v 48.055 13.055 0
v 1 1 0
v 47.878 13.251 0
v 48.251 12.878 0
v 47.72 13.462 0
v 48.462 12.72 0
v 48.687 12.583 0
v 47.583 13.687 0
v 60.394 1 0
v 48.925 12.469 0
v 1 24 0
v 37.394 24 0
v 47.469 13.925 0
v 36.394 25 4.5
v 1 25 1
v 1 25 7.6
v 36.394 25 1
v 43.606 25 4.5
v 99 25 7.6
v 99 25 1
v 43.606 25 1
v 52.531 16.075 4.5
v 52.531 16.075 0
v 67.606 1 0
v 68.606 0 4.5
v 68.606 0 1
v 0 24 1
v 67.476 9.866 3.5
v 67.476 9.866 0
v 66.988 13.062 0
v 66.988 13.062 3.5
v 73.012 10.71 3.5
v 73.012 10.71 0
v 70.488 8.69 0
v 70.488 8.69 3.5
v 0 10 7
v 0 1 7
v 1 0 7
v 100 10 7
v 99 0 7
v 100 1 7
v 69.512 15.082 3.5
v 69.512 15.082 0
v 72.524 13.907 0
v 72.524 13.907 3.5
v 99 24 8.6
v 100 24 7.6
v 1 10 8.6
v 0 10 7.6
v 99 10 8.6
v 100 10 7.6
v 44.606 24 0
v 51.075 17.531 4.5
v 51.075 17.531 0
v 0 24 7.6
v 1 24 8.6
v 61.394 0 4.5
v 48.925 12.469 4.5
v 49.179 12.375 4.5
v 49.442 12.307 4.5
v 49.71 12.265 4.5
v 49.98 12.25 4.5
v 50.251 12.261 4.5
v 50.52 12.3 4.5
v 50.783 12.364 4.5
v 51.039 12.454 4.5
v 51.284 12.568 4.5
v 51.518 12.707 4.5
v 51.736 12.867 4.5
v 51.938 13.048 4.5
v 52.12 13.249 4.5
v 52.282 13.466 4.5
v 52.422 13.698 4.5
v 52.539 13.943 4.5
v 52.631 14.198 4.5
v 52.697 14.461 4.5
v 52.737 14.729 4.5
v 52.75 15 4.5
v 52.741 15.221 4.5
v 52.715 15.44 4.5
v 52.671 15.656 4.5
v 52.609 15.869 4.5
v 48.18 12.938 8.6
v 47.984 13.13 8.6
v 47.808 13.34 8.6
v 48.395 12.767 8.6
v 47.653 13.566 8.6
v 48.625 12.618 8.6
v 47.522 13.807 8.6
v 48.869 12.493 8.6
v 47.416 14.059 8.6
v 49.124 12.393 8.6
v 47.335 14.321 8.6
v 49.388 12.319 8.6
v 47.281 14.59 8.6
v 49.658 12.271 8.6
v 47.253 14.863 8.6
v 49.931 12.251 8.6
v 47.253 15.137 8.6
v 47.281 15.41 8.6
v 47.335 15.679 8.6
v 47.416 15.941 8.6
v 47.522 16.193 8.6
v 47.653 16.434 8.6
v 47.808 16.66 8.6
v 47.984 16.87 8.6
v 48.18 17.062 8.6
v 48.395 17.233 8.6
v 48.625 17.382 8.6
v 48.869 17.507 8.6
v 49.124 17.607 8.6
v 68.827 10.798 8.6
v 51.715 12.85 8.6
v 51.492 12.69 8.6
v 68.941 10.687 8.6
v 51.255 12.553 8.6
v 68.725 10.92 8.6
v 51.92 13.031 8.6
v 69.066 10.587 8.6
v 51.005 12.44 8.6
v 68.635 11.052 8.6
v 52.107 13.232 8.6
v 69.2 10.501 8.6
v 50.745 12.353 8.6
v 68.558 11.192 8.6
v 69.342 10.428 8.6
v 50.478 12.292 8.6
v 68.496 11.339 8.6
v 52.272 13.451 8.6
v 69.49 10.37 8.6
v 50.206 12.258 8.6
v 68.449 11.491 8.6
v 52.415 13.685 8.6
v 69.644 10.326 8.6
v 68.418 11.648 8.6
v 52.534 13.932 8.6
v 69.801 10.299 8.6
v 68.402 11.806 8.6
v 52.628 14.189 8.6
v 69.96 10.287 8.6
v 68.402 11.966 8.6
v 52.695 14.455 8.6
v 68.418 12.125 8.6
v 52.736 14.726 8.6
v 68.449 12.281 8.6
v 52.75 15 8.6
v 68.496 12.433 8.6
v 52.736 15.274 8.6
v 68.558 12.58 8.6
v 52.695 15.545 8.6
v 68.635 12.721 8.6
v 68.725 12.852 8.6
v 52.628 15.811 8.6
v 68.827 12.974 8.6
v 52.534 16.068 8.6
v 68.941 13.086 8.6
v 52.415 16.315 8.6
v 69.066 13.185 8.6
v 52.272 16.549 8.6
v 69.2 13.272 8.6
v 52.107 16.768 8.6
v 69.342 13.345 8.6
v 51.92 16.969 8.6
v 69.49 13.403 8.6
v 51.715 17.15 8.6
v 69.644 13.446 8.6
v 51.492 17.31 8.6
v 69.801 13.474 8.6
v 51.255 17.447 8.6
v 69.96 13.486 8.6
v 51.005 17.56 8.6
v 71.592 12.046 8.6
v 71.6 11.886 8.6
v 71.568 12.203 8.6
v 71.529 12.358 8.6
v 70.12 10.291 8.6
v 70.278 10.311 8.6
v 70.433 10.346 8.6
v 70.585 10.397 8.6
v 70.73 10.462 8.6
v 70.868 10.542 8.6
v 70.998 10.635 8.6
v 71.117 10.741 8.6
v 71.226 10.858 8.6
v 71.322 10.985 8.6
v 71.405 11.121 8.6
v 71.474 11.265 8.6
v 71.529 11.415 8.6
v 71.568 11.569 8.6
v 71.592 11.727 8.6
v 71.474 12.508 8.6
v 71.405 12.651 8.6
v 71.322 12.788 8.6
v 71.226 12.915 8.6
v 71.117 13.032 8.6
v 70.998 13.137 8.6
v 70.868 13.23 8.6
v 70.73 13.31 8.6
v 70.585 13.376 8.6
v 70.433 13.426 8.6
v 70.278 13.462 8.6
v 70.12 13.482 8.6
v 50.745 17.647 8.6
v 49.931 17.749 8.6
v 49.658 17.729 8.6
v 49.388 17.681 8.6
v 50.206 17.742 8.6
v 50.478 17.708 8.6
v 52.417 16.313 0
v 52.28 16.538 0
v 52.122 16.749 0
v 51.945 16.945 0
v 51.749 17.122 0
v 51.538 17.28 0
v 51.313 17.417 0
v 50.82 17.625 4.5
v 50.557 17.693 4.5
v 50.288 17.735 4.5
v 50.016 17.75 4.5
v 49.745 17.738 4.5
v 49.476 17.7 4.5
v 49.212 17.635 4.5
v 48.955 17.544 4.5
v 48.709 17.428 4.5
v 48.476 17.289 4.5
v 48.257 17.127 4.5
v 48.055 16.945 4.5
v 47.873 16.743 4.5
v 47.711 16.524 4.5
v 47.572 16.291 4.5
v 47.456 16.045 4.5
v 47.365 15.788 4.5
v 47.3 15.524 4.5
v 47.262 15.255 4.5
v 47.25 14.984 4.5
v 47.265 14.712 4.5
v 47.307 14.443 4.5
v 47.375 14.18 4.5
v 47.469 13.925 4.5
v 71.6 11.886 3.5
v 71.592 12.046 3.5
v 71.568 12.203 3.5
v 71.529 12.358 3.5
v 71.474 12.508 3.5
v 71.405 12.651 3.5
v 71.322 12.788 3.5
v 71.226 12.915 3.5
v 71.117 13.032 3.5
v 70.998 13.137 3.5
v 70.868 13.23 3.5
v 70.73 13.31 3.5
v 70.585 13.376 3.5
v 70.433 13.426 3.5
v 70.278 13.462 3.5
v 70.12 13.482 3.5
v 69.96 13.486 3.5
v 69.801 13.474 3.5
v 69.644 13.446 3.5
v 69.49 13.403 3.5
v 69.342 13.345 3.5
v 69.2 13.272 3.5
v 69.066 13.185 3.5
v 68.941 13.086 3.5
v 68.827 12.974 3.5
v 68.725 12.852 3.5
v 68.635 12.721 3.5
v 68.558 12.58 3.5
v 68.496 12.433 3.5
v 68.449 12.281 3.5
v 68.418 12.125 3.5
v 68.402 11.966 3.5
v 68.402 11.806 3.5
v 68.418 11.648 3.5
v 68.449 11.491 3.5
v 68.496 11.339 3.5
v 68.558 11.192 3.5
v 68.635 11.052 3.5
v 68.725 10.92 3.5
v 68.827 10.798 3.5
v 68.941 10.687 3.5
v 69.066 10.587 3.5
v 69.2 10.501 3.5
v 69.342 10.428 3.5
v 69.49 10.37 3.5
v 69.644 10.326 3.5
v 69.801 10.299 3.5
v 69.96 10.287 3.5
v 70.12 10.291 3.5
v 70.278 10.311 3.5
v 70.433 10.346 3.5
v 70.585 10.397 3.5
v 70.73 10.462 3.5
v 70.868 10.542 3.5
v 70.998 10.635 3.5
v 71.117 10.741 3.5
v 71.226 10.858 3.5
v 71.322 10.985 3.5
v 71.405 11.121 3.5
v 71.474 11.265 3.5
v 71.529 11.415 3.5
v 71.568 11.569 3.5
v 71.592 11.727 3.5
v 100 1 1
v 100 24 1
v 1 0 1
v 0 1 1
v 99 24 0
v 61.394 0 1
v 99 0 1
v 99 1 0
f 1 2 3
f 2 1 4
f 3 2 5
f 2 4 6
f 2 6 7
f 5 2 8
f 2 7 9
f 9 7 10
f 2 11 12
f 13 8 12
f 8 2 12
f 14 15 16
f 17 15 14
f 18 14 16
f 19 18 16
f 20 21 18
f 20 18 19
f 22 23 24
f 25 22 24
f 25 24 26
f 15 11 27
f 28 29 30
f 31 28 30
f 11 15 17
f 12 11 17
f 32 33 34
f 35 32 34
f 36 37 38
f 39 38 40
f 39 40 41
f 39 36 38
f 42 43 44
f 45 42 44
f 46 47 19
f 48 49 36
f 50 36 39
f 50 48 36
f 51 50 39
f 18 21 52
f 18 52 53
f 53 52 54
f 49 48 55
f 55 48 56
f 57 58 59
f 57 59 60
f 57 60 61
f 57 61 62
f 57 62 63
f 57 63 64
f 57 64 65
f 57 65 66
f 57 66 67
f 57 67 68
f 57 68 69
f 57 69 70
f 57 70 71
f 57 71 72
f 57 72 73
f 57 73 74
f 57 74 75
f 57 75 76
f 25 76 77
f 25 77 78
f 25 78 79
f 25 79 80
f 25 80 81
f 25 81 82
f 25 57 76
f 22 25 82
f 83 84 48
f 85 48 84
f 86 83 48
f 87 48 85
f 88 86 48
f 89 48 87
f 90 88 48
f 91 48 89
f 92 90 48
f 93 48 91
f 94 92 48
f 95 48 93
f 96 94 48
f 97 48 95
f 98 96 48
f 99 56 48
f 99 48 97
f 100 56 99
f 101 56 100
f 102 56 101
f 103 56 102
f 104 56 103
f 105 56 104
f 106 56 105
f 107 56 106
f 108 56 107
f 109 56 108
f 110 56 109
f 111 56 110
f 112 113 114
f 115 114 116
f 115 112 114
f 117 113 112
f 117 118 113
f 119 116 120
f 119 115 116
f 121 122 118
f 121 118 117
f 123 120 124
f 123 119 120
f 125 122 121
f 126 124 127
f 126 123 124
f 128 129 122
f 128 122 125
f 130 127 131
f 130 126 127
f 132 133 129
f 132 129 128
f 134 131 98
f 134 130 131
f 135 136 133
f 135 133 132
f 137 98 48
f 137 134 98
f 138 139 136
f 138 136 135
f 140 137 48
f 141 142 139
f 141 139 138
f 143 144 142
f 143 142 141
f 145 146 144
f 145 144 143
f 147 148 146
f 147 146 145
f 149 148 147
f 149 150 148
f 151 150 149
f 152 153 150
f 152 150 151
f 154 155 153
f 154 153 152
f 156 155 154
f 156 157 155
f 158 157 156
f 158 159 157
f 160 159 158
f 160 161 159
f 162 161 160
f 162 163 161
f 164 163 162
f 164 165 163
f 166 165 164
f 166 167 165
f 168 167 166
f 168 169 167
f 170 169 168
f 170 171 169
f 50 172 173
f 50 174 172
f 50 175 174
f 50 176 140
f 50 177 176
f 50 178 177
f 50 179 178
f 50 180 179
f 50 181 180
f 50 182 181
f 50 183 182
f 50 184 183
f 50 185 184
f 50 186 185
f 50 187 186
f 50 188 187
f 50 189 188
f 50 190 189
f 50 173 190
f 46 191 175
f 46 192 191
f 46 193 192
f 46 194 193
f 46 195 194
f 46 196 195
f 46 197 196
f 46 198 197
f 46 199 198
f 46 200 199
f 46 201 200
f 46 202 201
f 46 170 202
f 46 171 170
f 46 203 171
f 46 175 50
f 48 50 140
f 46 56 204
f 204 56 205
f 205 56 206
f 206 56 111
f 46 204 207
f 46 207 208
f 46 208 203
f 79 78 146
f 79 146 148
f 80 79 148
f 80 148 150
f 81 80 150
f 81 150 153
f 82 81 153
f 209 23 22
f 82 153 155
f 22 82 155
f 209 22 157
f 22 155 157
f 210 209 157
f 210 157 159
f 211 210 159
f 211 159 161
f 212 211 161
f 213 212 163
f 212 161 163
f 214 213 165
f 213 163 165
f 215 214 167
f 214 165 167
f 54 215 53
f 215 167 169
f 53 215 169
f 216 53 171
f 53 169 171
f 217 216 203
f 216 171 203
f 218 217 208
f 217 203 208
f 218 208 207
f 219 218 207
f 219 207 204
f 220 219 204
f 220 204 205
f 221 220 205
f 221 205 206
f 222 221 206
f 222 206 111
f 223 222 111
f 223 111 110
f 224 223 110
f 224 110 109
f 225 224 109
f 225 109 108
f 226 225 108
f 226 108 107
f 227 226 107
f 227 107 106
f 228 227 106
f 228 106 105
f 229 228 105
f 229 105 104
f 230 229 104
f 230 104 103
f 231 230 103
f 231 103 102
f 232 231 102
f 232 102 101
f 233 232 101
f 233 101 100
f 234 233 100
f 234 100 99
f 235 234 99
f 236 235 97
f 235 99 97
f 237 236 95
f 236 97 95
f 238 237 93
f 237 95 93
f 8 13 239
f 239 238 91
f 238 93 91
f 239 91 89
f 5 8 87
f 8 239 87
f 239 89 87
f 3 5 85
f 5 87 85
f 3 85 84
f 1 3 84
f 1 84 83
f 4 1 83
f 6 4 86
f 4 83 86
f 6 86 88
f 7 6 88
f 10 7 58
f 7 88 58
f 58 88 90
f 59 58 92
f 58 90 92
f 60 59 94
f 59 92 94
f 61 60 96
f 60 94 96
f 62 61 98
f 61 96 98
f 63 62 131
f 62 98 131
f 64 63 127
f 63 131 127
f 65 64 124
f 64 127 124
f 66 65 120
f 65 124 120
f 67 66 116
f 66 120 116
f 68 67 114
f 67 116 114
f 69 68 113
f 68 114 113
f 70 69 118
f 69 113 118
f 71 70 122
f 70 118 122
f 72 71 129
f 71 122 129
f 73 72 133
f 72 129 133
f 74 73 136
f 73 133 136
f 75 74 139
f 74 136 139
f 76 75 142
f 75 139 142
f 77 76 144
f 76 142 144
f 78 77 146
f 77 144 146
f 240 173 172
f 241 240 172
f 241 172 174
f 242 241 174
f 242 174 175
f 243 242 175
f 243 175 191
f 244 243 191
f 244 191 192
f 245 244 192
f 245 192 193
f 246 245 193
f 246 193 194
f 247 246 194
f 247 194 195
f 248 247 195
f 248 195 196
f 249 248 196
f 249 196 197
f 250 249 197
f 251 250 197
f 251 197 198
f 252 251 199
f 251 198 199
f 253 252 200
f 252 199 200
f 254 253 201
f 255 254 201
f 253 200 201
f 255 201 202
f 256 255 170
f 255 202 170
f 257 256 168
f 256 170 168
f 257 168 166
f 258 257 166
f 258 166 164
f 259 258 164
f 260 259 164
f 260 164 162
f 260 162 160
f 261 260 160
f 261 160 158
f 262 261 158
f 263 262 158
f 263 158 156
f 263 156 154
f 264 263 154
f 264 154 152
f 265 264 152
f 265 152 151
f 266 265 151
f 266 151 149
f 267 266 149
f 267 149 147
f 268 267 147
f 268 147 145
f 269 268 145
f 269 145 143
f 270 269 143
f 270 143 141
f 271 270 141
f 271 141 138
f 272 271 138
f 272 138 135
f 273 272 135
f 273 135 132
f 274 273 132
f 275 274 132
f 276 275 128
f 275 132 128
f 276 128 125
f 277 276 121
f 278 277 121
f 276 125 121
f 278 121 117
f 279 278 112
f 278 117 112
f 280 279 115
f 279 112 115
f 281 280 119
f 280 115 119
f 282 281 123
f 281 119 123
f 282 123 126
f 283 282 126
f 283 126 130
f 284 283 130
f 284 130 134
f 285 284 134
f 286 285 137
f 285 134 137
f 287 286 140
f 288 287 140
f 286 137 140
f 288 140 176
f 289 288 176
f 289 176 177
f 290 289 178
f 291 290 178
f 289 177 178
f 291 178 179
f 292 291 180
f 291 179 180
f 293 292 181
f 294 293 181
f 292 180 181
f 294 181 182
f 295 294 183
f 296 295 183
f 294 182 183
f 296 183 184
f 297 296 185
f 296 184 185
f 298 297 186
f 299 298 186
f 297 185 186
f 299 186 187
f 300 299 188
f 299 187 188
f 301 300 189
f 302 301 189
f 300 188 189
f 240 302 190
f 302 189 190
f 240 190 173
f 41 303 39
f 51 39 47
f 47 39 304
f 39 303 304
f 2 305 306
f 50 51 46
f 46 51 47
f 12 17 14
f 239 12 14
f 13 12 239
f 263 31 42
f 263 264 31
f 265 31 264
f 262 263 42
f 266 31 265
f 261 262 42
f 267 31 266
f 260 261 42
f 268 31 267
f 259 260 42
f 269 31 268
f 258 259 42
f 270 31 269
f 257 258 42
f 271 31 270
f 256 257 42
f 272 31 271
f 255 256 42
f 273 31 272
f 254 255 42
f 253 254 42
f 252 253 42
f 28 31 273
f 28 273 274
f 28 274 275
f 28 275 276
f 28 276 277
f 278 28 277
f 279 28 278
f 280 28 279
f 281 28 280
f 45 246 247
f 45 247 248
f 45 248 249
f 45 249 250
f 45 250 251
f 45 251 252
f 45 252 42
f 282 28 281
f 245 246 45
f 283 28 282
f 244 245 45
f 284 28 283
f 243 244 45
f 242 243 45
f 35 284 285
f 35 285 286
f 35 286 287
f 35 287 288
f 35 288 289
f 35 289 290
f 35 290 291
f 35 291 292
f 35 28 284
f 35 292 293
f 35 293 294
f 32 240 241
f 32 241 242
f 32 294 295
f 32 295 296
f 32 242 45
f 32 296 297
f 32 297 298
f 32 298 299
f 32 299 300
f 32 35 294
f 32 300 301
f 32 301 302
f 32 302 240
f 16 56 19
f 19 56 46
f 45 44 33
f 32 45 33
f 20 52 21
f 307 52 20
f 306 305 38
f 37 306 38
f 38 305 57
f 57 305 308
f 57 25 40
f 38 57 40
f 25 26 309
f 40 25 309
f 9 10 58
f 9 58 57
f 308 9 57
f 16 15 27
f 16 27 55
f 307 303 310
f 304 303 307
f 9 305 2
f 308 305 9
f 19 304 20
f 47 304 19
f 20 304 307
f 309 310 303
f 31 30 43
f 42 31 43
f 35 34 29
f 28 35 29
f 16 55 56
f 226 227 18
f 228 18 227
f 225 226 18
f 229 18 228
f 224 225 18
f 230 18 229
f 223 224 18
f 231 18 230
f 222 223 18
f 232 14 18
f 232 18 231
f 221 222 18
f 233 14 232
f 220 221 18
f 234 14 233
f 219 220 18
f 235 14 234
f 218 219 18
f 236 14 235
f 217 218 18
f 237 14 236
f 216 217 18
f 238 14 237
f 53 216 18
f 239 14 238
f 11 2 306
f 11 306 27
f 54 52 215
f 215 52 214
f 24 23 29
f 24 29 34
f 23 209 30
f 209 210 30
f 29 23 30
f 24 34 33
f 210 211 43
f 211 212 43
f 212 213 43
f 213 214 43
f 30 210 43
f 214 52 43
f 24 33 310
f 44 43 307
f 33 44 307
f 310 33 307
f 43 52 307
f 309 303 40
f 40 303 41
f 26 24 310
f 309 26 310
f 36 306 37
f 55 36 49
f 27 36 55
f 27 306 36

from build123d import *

# Parameters (mm, degrees)
SKETCH_W        = 100
SKETCH_H        = 25
PAD_DEPTH       = 8.6
SKETCH001_W     = 111.182612
SKETCH001_H     = 13.535424
POCKET_DEPTH    = 1.6
SKETCH002_R     = 2.75
POCKET001_DEPTH = 8.601
POCKET002_DEPTH = 4.5
SKETCH004_R     = 1.6
POCKET003_DEPTH = 8.601
POCKET004_DEPTH = 3.5
CHAMFER_SIZE    = 1


with BuildPart() as part:
    # Sketch → Pad (new body)
    with BuildSketch(Plane.XY):
        with Locations((50, 12.5)):
            Rectangle(SKETCH_W, SKETCH_H)
    extrude(amount=PAD_DEPTH)

    # Sketch001 → Pocket (cut)
    with BuildSketch(Plane.XY.offset(8.6)):
        with Locations((49.408694, 3.232288)):
            Rectangle(SKETCH001_W, SKETCH001_H)
    extrude(amount=-POCKET_DEPTH, mode=Mode.SUBTRACT)

    # Sketch002 → Pocket001 (cut, through all)
    with BuildSketch(Plane.XY.offset(8.6)):
        with Locations((50, 15)):
            Circle(SKETCH002_R)
    extrude(amount=-POCKET001_DEPTH, mode=Mode.SUBTRACT)

    # Sketch003 → Pocket002 (cut)
    with BuildSketch(Plane(origin=(0, 0, 0), x_dir=(1, 0, 0), z_dir=(0, 0, -1))):
        with BuildLine():
            ThreePointArc((33.459446, -27.93431), (33.459446, -31.540554), (37.06569, -31.540554))
            Line((37.06569, -31.540554), (71.803122, 3.196878))
            ThreePointArc((71.803122, 3.196878), (71.803122, 6.803122), (68.196878, 6.803122))
            Line((33.459446, -27.93431), (68.196878, 6.803122))
        make_face()
    extrude(amount=-POCKET002_DEPTH, mode=Mode.SUBTRACT)

    # Sketch004 → Pocket003 (cut, through all)
    with BuildSketch(Plane.XY.offset(8.6)):
        with Locations((70, 11.886219)):
            Circle(SKETCH004_R)
    extrude(amount=-POCKET003_DEPTH, mode=Mode.SUBTRACT)

    # Sketch005 → Pocket004 (cut)
    with BuildSketch(Plane(origin=(0, 0, 0), x_dir=(1, 0, 0), z_dir=(0, 0, -1))):
        Polygon((72.524127, -13.906643), (73.011802, -10.710473), (70.487675, -8.690048), (67.475873, -9.865795), (66.988198, -13.061965), (69.512325, -15.08239), align=None)
    extrude(amount=-POCKET004_DEPTH, mode=Mode.SUBTRACT)

    # Chamfer
    chamfer_edges = [part.edges().sort_by_distance(p)[0] for p in [
        (30.696878, 0, 0),
        (0, 0, 3.5),
        (0, 12.5, 0),
        (18.196878, 25, 0),
        (84.303122, 0, 0),
        (100, 12.5, 0),
        (100, 0, 3.5),
        (100, 25, 4.3),
        (71.803122, 25, 0),
        (100, 17.5, 8.6),
        (0, 25, 4.3),
        (0, 17.5, 8.6),
        (50, 25, 8.6),
    ]]
    chamfer(chamfer_edges, length=CHAMFER_SIZE)


solid = part.part
